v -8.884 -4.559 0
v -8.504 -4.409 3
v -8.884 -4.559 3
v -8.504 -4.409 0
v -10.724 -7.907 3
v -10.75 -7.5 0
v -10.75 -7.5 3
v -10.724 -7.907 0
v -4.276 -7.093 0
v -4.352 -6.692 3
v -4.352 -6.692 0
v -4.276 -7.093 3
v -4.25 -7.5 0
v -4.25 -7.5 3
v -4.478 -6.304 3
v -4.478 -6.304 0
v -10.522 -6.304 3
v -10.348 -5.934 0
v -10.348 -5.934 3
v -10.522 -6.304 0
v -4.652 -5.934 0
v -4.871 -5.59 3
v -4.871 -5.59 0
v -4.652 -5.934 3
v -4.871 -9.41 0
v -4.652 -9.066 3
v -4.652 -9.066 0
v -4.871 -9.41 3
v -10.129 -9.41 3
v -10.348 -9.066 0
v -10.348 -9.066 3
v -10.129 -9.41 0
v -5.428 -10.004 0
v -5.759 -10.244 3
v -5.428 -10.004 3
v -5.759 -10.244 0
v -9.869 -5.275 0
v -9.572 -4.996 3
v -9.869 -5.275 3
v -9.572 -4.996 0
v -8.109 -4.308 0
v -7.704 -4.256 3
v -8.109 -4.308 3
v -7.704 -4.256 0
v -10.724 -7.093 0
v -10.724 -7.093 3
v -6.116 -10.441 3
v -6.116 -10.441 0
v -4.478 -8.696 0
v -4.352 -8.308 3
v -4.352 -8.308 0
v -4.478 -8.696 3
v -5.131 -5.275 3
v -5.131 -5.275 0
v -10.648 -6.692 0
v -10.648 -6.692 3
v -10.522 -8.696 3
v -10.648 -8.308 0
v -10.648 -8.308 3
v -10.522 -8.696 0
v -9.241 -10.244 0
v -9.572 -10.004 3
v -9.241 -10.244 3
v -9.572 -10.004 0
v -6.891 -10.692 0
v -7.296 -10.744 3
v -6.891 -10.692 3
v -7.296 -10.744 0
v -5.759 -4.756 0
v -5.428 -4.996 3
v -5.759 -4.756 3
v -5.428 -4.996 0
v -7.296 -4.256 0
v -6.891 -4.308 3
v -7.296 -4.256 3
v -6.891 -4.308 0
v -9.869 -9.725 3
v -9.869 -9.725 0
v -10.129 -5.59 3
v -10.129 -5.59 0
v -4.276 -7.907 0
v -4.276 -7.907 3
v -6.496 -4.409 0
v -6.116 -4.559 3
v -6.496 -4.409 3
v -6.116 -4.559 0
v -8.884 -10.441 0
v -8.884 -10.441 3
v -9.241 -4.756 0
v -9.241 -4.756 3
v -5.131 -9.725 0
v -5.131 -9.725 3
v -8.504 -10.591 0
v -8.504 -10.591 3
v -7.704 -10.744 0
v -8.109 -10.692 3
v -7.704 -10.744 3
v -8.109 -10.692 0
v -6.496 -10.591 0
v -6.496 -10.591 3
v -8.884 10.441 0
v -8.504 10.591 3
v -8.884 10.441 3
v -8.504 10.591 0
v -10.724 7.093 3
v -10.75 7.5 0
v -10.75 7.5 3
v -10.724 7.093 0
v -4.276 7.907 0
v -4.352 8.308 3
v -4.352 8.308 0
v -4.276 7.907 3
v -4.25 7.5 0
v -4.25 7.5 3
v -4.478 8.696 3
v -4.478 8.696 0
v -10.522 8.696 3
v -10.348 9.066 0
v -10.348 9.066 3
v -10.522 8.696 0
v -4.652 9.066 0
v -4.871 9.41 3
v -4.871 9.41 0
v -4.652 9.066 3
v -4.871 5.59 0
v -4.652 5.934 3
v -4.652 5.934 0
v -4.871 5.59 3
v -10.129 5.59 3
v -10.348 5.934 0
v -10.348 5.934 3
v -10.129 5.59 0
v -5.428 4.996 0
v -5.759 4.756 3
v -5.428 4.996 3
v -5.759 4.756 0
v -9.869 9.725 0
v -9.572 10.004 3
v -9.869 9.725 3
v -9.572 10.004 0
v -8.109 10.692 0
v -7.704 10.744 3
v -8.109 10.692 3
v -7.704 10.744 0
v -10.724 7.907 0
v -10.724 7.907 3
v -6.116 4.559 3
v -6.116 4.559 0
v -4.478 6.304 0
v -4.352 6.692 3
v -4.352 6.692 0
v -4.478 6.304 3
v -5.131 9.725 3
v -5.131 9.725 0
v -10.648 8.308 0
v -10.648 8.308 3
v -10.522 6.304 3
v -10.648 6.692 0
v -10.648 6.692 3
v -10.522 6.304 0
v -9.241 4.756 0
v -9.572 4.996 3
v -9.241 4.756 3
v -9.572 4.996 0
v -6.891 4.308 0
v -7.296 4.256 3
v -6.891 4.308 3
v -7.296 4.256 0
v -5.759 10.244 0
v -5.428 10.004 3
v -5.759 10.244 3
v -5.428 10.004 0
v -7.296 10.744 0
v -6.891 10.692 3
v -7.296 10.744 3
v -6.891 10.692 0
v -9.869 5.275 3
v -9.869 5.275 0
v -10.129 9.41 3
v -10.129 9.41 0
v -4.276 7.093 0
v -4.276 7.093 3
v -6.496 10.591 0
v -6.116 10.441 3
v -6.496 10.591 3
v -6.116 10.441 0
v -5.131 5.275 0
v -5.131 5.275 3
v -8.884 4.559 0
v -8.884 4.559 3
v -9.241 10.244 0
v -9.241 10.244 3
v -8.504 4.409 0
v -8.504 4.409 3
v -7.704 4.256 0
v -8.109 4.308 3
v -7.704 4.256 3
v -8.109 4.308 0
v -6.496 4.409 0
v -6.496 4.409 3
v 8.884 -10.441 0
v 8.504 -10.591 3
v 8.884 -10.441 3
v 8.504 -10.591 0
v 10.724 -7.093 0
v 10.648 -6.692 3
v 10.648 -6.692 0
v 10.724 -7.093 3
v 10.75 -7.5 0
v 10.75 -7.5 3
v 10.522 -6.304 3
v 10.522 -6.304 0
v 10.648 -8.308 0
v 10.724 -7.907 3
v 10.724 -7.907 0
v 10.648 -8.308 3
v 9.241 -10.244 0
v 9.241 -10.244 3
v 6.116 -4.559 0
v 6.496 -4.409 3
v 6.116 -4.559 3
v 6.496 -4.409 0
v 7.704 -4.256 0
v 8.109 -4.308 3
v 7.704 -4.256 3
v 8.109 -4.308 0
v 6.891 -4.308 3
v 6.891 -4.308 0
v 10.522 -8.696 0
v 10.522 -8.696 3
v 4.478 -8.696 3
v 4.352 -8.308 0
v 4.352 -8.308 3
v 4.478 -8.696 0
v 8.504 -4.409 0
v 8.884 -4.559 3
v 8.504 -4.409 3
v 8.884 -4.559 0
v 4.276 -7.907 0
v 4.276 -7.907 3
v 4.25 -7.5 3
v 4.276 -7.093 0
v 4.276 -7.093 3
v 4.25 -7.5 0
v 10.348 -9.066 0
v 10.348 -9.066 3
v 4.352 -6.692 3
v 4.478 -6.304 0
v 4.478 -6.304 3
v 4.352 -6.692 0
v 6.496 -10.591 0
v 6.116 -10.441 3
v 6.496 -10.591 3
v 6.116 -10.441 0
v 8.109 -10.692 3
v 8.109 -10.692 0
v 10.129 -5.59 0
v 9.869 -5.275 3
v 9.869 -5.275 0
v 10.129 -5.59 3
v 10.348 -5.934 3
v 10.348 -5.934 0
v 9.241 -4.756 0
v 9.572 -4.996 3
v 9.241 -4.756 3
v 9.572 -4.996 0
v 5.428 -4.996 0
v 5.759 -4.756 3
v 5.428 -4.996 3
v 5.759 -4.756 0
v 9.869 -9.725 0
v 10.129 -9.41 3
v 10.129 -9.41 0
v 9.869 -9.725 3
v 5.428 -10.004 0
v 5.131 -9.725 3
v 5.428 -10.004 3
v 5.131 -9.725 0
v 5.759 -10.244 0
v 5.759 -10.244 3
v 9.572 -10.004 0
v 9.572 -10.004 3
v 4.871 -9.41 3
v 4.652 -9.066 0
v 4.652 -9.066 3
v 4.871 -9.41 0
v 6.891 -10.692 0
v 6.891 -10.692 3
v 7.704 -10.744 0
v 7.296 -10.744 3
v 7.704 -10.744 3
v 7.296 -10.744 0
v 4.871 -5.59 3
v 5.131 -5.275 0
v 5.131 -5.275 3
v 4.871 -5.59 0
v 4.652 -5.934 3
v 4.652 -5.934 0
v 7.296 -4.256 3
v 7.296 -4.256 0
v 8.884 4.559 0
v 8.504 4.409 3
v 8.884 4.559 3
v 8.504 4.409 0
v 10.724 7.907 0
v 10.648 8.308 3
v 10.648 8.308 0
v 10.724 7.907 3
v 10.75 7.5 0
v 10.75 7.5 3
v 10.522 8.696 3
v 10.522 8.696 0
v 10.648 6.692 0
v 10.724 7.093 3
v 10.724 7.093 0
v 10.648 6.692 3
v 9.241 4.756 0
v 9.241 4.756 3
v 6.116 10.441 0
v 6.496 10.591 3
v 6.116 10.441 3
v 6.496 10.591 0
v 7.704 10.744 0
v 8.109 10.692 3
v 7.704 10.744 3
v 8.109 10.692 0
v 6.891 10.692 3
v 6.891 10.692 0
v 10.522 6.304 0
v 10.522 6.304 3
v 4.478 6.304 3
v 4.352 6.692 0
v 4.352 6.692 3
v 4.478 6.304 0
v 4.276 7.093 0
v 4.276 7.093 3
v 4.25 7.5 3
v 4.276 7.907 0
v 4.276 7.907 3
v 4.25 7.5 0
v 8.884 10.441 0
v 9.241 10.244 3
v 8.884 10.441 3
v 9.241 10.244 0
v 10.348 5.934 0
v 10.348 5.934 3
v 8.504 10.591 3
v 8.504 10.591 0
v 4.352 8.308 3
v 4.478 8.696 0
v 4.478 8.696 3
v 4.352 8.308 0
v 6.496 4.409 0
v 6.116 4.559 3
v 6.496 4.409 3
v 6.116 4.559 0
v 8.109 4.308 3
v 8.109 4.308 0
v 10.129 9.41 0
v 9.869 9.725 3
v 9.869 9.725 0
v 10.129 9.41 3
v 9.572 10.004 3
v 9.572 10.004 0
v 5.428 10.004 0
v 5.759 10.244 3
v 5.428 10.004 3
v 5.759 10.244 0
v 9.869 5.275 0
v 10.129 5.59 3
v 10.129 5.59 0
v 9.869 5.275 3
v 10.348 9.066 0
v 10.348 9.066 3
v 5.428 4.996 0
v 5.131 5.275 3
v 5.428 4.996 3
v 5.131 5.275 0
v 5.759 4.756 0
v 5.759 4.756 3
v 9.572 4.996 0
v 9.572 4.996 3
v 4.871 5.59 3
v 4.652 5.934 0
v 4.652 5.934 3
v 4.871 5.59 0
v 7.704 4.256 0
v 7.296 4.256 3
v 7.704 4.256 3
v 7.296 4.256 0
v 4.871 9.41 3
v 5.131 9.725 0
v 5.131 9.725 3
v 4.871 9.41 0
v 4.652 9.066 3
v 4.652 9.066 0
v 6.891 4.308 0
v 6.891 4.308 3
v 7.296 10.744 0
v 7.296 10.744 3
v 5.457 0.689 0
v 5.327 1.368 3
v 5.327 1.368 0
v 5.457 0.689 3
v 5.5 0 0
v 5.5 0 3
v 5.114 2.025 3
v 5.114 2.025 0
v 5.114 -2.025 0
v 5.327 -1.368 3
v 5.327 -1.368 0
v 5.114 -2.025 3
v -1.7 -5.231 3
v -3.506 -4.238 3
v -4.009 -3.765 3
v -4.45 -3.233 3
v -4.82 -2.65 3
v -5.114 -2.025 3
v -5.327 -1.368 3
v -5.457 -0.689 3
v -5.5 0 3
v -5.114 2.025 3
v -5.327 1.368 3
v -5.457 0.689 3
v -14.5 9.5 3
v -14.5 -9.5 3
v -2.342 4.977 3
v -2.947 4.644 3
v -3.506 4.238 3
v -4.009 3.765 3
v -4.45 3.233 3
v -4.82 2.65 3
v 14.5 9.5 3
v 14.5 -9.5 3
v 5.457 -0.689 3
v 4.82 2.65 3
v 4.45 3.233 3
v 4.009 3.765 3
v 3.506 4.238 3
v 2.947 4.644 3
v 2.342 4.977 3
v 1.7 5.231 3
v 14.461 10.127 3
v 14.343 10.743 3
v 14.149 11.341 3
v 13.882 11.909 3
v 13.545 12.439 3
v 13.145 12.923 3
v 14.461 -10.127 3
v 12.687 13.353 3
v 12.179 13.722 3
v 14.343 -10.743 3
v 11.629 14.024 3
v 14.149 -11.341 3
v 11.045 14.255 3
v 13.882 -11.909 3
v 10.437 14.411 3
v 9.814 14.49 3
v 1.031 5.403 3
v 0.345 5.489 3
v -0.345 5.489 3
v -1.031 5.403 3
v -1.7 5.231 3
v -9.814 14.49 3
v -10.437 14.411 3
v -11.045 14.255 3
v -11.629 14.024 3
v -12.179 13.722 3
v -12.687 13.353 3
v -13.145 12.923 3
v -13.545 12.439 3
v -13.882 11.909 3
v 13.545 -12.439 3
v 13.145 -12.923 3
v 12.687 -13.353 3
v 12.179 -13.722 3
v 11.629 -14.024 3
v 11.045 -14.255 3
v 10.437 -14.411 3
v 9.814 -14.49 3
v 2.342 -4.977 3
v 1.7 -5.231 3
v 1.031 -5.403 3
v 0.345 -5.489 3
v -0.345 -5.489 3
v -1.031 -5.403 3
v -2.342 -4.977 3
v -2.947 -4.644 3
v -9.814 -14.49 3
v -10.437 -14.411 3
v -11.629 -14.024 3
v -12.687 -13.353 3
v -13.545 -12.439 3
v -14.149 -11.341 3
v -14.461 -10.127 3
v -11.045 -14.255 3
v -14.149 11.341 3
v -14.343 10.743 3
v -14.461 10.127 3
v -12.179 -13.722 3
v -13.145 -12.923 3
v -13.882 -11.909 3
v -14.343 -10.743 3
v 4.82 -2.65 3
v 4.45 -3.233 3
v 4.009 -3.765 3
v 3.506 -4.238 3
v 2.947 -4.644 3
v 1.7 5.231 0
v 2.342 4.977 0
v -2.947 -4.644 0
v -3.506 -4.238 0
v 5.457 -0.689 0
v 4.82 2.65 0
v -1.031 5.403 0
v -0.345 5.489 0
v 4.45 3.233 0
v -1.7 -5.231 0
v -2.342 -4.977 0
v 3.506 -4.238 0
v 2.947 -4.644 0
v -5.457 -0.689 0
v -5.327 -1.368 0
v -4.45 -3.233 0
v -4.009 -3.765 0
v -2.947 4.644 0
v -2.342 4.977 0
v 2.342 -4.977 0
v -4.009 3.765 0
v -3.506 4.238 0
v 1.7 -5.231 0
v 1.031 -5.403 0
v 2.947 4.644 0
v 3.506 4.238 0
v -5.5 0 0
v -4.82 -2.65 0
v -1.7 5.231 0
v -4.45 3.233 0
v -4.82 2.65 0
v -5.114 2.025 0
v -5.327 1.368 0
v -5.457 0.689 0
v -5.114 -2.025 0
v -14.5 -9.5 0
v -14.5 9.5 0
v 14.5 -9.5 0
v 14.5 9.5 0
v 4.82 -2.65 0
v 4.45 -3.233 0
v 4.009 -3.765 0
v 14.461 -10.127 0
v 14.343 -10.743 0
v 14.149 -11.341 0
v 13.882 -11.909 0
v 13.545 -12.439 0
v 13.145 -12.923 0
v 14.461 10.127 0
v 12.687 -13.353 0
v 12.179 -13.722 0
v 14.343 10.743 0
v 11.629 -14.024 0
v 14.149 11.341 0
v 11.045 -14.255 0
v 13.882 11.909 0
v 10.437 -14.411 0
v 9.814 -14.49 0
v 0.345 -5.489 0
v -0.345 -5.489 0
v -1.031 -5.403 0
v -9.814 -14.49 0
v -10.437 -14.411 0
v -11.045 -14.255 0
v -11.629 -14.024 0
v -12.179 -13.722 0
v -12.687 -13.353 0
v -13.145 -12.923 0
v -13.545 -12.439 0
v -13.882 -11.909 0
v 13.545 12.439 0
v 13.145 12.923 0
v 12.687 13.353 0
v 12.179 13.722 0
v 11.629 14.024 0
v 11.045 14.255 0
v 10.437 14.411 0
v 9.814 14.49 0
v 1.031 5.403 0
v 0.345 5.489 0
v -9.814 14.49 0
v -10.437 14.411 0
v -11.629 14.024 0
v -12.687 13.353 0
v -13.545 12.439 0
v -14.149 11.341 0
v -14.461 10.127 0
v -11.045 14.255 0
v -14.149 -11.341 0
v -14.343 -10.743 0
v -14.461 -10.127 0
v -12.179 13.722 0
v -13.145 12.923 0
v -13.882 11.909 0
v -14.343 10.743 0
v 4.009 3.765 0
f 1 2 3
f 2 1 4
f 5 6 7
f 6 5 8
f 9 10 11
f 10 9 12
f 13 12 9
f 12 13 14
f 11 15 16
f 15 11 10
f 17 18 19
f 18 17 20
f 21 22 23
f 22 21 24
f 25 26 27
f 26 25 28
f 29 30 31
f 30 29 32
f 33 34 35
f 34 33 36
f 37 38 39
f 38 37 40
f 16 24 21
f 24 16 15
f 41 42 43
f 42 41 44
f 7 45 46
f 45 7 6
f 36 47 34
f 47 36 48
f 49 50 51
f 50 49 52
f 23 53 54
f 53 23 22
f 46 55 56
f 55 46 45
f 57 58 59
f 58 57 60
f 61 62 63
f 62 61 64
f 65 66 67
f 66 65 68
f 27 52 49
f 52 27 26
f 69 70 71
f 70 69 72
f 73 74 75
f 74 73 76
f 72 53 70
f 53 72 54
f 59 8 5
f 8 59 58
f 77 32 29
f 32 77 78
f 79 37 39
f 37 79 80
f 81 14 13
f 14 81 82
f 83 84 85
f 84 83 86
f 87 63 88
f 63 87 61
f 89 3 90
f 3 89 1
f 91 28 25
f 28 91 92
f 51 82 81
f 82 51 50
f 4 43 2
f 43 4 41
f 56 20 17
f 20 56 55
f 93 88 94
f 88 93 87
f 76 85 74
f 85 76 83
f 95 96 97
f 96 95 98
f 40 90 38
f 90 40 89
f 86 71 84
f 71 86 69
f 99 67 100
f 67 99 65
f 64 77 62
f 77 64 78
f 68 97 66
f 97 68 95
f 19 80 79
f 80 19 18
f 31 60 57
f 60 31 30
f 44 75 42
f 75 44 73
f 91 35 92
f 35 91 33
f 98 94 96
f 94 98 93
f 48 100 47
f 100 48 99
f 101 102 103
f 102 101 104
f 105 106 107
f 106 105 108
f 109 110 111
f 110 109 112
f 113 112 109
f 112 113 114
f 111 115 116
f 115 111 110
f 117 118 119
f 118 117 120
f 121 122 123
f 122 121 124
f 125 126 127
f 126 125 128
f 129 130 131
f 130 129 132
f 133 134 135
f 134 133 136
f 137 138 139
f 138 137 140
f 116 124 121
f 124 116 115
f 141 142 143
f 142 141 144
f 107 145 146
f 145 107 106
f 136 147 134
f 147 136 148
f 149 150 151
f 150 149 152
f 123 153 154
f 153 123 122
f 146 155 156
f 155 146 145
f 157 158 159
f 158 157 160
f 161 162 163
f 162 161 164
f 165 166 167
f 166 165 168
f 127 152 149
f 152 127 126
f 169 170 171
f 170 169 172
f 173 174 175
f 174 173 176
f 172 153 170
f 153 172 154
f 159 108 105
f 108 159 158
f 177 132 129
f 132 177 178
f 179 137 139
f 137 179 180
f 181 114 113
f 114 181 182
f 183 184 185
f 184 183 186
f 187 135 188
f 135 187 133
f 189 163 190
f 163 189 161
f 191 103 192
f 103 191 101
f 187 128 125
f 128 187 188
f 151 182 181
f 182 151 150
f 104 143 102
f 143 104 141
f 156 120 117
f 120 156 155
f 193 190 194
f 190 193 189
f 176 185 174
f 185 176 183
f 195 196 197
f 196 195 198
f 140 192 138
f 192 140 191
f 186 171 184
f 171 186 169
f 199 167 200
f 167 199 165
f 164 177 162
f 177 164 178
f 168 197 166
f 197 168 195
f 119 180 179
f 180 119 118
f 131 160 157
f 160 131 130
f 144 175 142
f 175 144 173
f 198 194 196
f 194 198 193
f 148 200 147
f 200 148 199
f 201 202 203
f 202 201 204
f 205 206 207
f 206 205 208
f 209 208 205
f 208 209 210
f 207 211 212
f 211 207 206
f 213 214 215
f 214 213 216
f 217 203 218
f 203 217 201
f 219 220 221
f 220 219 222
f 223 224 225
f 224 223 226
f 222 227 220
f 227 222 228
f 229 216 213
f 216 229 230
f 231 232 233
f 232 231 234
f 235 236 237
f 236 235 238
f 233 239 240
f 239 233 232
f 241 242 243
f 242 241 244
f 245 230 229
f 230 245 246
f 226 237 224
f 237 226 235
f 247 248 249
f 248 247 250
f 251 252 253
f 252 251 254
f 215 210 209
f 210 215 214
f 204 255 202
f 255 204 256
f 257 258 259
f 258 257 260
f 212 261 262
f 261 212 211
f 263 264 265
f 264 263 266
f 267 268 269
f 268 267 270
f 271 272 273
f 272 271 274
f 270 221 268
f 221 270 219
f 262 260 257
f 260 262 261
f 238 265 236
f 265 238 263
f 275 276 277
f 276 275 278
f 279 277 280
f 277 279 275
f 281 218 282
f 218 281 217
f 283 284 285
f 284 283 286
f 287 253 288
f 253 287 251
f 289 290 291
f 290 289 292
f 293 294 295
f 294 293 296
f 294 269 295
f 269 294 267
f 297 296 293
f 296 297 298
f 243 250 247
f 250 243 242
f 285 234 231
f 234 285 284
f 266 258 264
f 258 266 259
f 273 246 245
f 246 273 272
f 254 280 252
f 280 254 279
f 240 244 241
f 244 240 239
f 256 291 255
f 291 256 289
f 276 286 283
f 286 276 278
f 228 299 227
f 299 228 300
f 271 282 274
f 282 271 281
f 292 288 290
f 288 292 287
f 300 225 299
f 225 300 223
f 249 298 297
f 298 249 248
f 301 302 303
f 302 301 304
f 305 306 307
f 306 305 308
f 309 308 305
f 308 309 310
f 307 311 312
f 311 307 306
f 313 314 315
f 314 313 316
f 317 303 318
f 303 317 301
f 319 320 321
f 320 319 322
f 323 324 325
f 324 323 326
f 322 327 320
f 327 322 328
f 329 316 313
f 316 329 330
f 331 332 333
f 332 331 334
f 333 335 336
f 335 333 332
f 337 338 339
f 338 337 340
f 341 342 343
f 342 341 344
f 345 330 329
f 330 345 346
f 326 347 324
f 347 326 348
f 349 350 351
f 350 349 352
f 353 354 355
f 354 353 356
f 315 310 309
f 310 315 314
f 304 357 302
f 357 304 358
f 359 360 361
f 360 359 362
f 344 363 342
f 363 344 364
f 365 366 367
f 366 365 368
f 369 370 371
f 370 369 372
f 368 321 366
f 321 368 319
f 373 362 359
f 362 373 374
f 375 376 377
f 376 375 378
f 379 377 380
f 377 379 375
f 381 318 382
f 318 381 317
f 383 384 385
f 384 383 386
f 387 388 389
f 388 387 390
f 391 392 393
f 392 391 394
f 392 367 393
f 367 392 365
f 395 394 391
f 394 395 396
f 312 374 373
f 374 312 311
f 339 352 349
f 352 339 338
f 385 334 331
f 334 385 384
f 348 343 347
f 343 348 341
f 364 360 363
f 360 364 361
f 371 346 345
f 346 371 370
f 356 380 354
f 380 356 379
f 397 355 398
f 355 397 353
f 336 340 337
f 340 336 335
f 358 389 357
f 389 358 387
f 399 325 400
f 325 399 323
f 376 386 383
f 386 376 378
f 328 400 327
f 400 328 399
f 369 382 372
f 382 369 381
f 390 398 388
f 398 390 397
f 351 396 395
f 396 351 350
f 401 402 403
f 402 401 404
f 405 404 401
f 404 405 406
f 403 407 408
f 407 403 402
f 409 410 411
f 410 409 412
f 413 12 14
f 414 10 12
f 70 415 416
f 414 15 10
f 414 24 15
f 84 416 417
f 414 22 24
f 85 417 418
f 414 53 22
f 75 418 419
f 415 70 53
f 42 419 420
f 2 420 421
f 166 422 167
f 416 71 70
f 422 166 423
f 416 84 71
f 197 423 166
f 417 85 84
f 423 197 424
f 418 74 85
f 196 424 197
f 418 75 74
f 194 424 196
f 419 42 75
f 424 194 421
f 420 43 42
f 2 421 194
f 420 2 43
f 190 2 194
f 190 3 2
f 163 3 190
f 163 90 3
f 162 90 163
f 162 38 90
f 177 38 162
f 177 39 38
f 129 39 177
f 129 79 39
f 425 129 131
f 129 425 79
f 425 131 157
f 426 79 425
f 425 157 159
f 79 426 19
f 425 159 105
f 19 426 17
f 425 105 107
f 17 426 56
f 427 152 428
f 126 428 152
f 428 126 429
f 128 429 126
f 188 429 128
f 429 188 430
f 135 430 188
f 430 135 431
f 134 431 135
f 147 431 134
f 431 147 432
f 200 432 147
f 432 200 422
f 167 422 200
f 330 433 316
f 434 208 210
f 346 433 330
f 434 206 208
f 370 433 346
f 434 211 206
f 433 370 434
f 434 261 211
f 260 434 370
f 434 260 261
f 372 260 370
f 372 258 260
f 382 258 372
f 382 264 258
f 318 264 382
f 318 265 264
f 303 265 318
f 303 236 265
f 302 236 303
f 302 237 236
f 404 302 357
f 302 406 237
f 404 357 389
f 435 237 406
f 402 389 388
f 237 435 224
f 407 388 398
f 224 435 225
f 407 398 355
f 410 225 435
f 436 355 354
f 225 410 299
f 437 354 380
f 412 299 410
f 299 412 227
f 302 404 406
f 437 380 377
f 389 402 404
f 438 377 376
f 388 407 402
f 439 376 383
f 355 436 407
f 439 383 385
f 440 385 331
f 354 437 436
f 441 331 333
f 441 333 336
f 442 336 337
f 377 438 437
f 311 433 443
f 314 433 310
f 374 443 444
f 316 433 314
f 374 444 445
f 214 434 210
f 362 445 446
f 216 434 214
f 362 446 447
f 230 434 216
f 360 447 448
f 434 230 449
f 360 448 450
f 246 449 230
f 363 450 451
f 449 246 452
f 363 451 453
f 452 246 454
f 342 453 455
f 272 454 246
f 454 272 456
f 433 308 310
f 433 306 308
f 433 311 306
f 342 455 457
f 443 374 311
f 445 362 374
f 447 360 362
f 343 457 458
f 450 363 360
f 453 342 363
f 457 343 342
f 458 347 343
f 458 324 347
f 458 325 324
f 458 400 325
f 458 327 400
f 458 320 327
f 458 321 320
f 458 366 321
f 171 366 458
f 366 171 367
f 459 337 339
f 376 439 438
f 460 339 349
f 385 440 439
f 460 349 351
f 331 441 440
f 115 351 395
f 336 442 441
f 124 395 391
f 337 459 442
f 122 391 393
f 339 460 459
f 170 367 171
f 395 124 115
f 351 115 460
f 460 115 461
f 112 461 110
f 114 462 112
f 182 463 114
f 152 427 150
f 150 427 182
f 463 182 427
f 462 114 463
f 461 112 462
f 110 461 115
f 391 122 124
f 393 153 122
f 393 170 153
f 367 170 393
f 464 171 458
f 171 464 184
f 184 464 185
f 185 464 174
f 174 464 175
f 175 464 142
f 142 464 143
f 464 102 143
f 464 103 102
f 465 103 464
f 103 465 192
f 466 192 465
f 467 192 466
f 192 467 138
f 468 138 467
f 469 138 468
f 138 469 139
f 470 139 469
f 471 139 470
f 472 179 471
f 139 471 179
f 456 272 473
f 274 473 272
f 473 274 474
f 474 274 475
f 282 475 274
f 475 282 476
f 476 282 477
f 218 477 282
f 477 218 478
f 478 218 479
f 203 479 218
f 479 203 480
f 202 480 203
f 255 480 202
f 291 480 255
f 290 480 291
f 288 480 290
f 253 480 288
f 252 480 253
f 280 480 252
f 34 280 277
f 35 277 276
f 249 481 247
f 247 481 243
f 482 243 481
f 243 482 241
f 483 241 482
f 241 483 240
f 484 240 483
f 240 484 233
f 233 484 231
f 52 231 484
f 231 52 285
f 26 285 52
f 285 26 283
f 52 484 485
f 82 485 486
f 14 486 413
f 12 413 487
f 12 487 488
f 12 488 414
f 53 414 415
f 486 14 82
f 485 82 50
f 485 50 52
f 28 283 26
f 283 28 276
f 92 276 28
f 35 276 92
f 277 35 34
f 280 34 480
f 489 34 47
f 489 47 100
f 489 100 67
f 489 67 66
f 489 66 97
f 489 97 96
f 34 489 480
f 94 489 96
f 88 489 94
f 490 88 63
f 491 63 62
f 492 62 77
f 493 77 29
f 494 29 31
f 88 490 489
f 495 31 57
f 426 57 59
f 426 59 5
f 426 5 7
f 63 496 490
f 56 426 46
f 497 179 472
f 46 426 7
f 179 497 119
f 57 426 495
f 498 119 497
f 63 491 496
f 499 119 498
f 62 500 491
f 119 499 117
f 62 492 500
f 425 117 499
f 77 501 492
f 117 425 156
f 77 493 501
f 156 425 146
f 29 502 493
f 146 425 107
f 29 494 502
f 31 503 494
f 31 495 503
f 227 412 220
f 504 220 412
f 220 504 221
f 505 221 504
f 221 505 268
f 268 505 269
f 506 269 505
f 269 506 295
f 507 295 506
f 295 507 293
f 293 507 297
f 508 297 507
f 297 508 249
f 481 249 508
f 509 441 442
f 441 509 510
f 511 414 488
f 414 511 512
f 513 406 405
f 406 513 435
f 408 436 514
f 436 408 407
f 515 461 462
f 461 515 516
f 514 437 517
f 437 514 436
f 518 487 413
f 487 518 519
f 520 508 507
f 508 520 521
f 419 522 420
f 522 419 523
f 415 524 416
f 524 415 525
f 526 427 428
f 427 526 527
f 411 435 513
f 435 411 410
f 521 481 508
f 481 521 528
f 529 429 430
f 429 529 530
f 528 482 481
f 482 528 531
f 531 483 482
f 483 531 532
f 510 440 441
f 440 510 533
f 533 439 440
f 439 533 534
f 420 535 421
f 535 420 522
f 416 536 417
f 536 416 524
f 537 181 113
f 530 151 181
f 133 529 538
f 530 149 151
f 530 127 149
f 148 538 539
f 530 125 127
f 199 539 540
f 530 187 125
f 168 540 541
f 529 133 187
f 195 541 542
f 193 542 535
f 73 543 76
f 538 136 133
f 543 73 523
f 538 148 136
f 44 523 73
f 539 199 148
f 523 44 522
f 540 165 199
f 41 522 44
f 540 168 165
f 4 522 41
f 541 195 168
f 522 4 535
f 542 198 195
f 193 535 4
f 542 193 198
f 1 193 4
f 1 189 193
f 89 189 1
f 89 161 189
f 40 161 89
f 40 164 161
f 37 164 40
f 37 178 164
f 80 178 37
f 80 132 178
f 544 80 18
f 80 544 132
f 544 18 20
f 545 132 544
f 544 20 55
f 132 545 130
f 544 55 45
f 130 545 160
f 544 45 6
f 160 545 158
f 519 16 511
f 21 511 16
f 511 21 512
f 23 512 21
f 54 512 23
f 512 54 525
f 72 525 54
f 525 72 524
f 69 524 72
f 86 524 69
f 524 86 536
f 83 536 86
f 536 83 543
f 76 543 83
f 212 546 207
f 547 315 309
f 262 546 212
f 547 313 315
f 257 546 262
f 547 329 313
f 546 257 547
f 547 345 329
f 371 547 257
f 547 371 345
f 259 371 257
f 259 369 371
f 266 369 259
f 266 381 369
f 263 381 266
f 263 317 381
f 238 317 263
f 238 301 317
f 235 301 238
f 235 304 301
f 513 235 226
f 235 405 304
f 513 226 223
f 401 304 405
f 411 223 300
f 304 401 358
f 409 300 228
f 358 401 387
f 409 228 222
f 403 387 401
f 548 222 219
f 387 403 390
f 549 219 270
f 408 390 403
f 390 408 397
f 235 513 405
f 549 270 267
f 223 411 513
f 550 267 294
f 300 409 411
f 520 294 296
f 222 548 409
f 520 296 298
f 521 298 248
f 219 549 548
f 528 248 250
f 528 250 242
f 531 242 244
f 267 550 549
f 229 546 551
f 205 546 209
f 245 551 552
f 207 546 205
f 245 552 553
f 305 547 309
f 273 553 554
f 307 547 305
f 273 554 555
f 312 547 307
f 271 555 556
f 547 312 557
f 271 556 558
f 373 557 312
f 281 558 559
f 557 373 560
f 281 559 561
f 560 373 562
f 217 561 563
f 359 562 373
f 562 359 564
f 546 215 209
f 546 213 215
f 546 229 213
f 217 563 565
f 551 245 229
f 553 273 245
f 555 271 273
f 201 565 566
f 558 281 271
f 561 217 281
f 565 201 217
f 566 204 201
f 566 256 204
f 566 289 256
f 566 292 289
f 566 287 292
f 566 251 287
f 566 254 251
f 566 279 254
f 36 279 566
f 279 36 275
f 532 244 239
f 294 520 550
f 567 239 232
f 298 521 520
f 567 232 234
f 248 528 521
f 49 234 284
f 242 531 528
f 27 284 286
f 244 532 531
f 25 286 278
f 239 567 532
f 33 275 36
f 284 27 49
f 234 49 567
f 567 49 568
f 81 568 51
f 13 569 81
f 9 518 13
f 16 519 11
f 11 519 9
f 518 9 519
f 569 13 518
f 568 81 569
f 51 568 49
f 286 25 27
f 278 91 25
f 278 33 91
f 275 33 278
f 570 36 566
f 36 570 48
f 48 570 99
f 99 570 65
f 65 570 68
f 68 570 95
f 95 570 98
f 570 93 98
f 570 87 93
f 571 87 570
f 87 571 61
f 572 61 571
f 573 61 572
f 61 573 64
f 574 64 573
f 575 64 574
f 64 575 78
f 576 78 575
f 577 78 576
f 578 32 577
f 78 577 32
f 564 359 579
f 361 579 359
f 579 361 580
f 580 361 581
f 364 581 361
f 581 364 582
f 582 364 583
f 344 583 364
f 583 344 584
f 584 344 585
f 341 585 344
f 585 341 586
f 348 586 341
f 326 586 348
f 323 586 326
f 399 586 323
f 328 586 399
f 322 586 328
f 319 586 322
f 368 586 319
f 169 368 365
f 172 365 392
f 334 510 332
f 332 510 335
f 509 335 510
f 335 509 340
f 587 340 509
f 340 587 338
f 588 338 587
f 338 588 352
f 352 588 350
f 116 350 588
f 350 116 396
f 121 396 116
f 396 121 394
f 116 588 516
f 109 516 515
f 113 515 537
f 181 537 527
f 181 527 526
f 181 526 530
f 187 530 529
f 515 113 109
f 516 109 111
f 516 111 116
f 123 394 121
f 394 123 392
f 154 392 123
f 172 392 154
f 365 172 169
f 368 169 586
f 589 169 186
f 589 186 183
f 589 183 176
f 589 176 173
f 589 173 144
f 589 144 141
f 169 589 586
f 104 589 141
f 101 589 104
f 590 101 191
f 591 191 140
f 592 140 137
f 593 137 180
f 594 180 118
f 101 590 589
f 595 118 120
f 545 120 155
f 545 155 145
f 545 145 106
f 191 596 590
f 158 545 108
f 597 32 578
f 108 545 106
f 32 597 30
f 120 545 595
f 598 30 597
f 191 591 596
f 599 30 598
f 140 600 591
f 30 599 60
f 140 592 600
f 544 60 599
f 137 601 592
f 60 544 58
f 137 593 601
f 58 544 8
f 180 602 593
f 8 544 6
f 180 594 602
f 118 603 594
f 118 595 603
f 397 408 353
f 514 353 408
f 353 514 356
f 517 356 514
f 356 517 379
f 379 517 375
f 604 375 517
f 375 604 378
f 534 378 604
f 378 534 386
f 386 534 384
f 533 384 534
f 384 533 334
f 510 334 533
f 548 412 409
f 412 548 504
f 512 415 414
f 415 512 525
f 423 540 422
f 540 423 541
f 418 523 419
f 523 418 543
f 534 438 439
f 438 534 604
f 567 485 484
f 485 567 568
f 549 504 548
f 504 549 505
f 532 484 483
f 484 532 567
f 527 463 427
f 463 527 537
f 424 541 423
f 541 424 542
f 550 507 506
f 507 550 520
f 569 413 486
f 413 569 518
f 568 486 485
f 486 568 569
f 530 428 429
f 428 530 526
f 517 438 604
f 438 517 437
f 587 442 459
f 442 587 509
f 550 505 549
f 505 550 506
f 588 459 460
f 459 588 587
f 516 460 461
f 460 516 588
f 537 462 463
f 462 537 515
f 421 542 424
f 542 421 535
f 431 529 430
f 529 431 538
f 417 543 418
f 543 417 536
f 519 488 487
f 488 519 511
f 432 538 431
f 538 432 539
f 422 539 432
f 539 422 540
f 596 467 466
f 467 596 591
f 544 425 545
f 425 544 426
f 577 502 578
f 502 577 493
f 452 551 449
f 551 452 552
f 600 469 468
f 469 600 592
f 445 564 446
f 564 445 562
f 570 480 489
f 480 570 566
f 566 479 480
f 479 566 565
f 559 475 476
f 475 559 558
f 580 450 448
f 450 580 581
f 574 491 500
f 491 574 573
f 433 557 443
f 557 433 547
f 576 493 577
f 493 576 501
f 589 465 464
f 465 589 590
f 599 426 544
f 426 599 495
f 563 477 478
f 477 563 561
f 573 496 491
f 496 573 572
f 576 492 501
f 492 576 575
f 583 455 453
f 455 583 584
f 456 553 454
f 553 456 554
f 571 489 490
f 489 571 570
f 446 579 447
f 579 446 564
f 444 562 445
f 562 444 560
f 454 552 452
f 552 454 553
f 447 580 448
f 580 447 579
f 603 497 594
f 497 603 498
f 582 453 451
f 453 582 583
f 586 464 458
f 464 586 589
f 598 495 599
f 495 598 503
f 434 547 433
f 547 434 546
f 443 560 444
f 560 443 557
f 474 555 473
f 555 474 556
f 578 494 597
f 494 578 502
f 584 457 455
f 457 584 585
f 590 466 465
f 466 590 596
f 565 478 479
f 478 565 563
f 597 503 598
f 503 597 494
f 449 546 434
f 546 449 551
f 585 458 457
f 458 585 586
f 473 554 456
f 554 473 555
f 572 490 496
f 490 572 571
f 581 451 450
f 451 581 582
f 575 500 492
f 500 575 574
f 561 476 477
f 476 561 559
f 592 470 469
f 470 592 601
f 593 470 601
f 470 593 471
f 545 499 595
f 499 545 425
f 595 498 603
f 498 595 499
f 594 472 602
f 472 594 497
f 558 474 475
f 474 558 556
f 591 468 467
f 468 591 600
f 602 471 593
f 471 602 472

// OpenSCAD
$fn = 50;

difference() {
	union() {
		hull() {
			translate(v = [-9.5, 9.5, 0]) {
				cylinder(h = 3, r = 5);
			}
			translate(v = [9.5, 9.5, 0]) {
				cylinder(h = 3, r = 5);
			}
			translate(v = [-9.5, -9.5, 0]) {
				cylinder(h = 3, r = 5);
			}
			translate(v = [9.5, -9.5, 0]) {
				cylinder(h = 3, r = 5);
			}
		}
	}
	union() {
		translate(v = [-7.5, -7.5, -100.0]) {
			cylinder(h = 200, r = 3.25);
		}
		translate(v = [-7.5, 7.5, -100.0]) {
			cylinder(h = 200, r = 3.25);
		}
		translate(v = [7.5, -7.5, -100.0]) {
			cylinder(h = 200, r = 3.25);
		}
		translate(v = [7.5, 7.5, -100.0]) {
			cylinder(h = 200, r = 3.25);
		}
		translate(v = [-7.5, -7.5, -100.0]) {
			cylinder(h = 200, r = 1.8);
		}
		translate(v = [-7.5, 7.5, -100.0]) {
			cylinder(h = 200, r = 1.8);
		}
		translate(v = [7.5, -7.5, -100.0]) {
			cylinder(h = 200, r = 1.8);
		}
		translate(v = [7.5, 7.5, -100.0]) {
			cylinder(h = 200, r = 1.8);
		}
		cylinder(h = 3, r = 5.5);
	}
}
